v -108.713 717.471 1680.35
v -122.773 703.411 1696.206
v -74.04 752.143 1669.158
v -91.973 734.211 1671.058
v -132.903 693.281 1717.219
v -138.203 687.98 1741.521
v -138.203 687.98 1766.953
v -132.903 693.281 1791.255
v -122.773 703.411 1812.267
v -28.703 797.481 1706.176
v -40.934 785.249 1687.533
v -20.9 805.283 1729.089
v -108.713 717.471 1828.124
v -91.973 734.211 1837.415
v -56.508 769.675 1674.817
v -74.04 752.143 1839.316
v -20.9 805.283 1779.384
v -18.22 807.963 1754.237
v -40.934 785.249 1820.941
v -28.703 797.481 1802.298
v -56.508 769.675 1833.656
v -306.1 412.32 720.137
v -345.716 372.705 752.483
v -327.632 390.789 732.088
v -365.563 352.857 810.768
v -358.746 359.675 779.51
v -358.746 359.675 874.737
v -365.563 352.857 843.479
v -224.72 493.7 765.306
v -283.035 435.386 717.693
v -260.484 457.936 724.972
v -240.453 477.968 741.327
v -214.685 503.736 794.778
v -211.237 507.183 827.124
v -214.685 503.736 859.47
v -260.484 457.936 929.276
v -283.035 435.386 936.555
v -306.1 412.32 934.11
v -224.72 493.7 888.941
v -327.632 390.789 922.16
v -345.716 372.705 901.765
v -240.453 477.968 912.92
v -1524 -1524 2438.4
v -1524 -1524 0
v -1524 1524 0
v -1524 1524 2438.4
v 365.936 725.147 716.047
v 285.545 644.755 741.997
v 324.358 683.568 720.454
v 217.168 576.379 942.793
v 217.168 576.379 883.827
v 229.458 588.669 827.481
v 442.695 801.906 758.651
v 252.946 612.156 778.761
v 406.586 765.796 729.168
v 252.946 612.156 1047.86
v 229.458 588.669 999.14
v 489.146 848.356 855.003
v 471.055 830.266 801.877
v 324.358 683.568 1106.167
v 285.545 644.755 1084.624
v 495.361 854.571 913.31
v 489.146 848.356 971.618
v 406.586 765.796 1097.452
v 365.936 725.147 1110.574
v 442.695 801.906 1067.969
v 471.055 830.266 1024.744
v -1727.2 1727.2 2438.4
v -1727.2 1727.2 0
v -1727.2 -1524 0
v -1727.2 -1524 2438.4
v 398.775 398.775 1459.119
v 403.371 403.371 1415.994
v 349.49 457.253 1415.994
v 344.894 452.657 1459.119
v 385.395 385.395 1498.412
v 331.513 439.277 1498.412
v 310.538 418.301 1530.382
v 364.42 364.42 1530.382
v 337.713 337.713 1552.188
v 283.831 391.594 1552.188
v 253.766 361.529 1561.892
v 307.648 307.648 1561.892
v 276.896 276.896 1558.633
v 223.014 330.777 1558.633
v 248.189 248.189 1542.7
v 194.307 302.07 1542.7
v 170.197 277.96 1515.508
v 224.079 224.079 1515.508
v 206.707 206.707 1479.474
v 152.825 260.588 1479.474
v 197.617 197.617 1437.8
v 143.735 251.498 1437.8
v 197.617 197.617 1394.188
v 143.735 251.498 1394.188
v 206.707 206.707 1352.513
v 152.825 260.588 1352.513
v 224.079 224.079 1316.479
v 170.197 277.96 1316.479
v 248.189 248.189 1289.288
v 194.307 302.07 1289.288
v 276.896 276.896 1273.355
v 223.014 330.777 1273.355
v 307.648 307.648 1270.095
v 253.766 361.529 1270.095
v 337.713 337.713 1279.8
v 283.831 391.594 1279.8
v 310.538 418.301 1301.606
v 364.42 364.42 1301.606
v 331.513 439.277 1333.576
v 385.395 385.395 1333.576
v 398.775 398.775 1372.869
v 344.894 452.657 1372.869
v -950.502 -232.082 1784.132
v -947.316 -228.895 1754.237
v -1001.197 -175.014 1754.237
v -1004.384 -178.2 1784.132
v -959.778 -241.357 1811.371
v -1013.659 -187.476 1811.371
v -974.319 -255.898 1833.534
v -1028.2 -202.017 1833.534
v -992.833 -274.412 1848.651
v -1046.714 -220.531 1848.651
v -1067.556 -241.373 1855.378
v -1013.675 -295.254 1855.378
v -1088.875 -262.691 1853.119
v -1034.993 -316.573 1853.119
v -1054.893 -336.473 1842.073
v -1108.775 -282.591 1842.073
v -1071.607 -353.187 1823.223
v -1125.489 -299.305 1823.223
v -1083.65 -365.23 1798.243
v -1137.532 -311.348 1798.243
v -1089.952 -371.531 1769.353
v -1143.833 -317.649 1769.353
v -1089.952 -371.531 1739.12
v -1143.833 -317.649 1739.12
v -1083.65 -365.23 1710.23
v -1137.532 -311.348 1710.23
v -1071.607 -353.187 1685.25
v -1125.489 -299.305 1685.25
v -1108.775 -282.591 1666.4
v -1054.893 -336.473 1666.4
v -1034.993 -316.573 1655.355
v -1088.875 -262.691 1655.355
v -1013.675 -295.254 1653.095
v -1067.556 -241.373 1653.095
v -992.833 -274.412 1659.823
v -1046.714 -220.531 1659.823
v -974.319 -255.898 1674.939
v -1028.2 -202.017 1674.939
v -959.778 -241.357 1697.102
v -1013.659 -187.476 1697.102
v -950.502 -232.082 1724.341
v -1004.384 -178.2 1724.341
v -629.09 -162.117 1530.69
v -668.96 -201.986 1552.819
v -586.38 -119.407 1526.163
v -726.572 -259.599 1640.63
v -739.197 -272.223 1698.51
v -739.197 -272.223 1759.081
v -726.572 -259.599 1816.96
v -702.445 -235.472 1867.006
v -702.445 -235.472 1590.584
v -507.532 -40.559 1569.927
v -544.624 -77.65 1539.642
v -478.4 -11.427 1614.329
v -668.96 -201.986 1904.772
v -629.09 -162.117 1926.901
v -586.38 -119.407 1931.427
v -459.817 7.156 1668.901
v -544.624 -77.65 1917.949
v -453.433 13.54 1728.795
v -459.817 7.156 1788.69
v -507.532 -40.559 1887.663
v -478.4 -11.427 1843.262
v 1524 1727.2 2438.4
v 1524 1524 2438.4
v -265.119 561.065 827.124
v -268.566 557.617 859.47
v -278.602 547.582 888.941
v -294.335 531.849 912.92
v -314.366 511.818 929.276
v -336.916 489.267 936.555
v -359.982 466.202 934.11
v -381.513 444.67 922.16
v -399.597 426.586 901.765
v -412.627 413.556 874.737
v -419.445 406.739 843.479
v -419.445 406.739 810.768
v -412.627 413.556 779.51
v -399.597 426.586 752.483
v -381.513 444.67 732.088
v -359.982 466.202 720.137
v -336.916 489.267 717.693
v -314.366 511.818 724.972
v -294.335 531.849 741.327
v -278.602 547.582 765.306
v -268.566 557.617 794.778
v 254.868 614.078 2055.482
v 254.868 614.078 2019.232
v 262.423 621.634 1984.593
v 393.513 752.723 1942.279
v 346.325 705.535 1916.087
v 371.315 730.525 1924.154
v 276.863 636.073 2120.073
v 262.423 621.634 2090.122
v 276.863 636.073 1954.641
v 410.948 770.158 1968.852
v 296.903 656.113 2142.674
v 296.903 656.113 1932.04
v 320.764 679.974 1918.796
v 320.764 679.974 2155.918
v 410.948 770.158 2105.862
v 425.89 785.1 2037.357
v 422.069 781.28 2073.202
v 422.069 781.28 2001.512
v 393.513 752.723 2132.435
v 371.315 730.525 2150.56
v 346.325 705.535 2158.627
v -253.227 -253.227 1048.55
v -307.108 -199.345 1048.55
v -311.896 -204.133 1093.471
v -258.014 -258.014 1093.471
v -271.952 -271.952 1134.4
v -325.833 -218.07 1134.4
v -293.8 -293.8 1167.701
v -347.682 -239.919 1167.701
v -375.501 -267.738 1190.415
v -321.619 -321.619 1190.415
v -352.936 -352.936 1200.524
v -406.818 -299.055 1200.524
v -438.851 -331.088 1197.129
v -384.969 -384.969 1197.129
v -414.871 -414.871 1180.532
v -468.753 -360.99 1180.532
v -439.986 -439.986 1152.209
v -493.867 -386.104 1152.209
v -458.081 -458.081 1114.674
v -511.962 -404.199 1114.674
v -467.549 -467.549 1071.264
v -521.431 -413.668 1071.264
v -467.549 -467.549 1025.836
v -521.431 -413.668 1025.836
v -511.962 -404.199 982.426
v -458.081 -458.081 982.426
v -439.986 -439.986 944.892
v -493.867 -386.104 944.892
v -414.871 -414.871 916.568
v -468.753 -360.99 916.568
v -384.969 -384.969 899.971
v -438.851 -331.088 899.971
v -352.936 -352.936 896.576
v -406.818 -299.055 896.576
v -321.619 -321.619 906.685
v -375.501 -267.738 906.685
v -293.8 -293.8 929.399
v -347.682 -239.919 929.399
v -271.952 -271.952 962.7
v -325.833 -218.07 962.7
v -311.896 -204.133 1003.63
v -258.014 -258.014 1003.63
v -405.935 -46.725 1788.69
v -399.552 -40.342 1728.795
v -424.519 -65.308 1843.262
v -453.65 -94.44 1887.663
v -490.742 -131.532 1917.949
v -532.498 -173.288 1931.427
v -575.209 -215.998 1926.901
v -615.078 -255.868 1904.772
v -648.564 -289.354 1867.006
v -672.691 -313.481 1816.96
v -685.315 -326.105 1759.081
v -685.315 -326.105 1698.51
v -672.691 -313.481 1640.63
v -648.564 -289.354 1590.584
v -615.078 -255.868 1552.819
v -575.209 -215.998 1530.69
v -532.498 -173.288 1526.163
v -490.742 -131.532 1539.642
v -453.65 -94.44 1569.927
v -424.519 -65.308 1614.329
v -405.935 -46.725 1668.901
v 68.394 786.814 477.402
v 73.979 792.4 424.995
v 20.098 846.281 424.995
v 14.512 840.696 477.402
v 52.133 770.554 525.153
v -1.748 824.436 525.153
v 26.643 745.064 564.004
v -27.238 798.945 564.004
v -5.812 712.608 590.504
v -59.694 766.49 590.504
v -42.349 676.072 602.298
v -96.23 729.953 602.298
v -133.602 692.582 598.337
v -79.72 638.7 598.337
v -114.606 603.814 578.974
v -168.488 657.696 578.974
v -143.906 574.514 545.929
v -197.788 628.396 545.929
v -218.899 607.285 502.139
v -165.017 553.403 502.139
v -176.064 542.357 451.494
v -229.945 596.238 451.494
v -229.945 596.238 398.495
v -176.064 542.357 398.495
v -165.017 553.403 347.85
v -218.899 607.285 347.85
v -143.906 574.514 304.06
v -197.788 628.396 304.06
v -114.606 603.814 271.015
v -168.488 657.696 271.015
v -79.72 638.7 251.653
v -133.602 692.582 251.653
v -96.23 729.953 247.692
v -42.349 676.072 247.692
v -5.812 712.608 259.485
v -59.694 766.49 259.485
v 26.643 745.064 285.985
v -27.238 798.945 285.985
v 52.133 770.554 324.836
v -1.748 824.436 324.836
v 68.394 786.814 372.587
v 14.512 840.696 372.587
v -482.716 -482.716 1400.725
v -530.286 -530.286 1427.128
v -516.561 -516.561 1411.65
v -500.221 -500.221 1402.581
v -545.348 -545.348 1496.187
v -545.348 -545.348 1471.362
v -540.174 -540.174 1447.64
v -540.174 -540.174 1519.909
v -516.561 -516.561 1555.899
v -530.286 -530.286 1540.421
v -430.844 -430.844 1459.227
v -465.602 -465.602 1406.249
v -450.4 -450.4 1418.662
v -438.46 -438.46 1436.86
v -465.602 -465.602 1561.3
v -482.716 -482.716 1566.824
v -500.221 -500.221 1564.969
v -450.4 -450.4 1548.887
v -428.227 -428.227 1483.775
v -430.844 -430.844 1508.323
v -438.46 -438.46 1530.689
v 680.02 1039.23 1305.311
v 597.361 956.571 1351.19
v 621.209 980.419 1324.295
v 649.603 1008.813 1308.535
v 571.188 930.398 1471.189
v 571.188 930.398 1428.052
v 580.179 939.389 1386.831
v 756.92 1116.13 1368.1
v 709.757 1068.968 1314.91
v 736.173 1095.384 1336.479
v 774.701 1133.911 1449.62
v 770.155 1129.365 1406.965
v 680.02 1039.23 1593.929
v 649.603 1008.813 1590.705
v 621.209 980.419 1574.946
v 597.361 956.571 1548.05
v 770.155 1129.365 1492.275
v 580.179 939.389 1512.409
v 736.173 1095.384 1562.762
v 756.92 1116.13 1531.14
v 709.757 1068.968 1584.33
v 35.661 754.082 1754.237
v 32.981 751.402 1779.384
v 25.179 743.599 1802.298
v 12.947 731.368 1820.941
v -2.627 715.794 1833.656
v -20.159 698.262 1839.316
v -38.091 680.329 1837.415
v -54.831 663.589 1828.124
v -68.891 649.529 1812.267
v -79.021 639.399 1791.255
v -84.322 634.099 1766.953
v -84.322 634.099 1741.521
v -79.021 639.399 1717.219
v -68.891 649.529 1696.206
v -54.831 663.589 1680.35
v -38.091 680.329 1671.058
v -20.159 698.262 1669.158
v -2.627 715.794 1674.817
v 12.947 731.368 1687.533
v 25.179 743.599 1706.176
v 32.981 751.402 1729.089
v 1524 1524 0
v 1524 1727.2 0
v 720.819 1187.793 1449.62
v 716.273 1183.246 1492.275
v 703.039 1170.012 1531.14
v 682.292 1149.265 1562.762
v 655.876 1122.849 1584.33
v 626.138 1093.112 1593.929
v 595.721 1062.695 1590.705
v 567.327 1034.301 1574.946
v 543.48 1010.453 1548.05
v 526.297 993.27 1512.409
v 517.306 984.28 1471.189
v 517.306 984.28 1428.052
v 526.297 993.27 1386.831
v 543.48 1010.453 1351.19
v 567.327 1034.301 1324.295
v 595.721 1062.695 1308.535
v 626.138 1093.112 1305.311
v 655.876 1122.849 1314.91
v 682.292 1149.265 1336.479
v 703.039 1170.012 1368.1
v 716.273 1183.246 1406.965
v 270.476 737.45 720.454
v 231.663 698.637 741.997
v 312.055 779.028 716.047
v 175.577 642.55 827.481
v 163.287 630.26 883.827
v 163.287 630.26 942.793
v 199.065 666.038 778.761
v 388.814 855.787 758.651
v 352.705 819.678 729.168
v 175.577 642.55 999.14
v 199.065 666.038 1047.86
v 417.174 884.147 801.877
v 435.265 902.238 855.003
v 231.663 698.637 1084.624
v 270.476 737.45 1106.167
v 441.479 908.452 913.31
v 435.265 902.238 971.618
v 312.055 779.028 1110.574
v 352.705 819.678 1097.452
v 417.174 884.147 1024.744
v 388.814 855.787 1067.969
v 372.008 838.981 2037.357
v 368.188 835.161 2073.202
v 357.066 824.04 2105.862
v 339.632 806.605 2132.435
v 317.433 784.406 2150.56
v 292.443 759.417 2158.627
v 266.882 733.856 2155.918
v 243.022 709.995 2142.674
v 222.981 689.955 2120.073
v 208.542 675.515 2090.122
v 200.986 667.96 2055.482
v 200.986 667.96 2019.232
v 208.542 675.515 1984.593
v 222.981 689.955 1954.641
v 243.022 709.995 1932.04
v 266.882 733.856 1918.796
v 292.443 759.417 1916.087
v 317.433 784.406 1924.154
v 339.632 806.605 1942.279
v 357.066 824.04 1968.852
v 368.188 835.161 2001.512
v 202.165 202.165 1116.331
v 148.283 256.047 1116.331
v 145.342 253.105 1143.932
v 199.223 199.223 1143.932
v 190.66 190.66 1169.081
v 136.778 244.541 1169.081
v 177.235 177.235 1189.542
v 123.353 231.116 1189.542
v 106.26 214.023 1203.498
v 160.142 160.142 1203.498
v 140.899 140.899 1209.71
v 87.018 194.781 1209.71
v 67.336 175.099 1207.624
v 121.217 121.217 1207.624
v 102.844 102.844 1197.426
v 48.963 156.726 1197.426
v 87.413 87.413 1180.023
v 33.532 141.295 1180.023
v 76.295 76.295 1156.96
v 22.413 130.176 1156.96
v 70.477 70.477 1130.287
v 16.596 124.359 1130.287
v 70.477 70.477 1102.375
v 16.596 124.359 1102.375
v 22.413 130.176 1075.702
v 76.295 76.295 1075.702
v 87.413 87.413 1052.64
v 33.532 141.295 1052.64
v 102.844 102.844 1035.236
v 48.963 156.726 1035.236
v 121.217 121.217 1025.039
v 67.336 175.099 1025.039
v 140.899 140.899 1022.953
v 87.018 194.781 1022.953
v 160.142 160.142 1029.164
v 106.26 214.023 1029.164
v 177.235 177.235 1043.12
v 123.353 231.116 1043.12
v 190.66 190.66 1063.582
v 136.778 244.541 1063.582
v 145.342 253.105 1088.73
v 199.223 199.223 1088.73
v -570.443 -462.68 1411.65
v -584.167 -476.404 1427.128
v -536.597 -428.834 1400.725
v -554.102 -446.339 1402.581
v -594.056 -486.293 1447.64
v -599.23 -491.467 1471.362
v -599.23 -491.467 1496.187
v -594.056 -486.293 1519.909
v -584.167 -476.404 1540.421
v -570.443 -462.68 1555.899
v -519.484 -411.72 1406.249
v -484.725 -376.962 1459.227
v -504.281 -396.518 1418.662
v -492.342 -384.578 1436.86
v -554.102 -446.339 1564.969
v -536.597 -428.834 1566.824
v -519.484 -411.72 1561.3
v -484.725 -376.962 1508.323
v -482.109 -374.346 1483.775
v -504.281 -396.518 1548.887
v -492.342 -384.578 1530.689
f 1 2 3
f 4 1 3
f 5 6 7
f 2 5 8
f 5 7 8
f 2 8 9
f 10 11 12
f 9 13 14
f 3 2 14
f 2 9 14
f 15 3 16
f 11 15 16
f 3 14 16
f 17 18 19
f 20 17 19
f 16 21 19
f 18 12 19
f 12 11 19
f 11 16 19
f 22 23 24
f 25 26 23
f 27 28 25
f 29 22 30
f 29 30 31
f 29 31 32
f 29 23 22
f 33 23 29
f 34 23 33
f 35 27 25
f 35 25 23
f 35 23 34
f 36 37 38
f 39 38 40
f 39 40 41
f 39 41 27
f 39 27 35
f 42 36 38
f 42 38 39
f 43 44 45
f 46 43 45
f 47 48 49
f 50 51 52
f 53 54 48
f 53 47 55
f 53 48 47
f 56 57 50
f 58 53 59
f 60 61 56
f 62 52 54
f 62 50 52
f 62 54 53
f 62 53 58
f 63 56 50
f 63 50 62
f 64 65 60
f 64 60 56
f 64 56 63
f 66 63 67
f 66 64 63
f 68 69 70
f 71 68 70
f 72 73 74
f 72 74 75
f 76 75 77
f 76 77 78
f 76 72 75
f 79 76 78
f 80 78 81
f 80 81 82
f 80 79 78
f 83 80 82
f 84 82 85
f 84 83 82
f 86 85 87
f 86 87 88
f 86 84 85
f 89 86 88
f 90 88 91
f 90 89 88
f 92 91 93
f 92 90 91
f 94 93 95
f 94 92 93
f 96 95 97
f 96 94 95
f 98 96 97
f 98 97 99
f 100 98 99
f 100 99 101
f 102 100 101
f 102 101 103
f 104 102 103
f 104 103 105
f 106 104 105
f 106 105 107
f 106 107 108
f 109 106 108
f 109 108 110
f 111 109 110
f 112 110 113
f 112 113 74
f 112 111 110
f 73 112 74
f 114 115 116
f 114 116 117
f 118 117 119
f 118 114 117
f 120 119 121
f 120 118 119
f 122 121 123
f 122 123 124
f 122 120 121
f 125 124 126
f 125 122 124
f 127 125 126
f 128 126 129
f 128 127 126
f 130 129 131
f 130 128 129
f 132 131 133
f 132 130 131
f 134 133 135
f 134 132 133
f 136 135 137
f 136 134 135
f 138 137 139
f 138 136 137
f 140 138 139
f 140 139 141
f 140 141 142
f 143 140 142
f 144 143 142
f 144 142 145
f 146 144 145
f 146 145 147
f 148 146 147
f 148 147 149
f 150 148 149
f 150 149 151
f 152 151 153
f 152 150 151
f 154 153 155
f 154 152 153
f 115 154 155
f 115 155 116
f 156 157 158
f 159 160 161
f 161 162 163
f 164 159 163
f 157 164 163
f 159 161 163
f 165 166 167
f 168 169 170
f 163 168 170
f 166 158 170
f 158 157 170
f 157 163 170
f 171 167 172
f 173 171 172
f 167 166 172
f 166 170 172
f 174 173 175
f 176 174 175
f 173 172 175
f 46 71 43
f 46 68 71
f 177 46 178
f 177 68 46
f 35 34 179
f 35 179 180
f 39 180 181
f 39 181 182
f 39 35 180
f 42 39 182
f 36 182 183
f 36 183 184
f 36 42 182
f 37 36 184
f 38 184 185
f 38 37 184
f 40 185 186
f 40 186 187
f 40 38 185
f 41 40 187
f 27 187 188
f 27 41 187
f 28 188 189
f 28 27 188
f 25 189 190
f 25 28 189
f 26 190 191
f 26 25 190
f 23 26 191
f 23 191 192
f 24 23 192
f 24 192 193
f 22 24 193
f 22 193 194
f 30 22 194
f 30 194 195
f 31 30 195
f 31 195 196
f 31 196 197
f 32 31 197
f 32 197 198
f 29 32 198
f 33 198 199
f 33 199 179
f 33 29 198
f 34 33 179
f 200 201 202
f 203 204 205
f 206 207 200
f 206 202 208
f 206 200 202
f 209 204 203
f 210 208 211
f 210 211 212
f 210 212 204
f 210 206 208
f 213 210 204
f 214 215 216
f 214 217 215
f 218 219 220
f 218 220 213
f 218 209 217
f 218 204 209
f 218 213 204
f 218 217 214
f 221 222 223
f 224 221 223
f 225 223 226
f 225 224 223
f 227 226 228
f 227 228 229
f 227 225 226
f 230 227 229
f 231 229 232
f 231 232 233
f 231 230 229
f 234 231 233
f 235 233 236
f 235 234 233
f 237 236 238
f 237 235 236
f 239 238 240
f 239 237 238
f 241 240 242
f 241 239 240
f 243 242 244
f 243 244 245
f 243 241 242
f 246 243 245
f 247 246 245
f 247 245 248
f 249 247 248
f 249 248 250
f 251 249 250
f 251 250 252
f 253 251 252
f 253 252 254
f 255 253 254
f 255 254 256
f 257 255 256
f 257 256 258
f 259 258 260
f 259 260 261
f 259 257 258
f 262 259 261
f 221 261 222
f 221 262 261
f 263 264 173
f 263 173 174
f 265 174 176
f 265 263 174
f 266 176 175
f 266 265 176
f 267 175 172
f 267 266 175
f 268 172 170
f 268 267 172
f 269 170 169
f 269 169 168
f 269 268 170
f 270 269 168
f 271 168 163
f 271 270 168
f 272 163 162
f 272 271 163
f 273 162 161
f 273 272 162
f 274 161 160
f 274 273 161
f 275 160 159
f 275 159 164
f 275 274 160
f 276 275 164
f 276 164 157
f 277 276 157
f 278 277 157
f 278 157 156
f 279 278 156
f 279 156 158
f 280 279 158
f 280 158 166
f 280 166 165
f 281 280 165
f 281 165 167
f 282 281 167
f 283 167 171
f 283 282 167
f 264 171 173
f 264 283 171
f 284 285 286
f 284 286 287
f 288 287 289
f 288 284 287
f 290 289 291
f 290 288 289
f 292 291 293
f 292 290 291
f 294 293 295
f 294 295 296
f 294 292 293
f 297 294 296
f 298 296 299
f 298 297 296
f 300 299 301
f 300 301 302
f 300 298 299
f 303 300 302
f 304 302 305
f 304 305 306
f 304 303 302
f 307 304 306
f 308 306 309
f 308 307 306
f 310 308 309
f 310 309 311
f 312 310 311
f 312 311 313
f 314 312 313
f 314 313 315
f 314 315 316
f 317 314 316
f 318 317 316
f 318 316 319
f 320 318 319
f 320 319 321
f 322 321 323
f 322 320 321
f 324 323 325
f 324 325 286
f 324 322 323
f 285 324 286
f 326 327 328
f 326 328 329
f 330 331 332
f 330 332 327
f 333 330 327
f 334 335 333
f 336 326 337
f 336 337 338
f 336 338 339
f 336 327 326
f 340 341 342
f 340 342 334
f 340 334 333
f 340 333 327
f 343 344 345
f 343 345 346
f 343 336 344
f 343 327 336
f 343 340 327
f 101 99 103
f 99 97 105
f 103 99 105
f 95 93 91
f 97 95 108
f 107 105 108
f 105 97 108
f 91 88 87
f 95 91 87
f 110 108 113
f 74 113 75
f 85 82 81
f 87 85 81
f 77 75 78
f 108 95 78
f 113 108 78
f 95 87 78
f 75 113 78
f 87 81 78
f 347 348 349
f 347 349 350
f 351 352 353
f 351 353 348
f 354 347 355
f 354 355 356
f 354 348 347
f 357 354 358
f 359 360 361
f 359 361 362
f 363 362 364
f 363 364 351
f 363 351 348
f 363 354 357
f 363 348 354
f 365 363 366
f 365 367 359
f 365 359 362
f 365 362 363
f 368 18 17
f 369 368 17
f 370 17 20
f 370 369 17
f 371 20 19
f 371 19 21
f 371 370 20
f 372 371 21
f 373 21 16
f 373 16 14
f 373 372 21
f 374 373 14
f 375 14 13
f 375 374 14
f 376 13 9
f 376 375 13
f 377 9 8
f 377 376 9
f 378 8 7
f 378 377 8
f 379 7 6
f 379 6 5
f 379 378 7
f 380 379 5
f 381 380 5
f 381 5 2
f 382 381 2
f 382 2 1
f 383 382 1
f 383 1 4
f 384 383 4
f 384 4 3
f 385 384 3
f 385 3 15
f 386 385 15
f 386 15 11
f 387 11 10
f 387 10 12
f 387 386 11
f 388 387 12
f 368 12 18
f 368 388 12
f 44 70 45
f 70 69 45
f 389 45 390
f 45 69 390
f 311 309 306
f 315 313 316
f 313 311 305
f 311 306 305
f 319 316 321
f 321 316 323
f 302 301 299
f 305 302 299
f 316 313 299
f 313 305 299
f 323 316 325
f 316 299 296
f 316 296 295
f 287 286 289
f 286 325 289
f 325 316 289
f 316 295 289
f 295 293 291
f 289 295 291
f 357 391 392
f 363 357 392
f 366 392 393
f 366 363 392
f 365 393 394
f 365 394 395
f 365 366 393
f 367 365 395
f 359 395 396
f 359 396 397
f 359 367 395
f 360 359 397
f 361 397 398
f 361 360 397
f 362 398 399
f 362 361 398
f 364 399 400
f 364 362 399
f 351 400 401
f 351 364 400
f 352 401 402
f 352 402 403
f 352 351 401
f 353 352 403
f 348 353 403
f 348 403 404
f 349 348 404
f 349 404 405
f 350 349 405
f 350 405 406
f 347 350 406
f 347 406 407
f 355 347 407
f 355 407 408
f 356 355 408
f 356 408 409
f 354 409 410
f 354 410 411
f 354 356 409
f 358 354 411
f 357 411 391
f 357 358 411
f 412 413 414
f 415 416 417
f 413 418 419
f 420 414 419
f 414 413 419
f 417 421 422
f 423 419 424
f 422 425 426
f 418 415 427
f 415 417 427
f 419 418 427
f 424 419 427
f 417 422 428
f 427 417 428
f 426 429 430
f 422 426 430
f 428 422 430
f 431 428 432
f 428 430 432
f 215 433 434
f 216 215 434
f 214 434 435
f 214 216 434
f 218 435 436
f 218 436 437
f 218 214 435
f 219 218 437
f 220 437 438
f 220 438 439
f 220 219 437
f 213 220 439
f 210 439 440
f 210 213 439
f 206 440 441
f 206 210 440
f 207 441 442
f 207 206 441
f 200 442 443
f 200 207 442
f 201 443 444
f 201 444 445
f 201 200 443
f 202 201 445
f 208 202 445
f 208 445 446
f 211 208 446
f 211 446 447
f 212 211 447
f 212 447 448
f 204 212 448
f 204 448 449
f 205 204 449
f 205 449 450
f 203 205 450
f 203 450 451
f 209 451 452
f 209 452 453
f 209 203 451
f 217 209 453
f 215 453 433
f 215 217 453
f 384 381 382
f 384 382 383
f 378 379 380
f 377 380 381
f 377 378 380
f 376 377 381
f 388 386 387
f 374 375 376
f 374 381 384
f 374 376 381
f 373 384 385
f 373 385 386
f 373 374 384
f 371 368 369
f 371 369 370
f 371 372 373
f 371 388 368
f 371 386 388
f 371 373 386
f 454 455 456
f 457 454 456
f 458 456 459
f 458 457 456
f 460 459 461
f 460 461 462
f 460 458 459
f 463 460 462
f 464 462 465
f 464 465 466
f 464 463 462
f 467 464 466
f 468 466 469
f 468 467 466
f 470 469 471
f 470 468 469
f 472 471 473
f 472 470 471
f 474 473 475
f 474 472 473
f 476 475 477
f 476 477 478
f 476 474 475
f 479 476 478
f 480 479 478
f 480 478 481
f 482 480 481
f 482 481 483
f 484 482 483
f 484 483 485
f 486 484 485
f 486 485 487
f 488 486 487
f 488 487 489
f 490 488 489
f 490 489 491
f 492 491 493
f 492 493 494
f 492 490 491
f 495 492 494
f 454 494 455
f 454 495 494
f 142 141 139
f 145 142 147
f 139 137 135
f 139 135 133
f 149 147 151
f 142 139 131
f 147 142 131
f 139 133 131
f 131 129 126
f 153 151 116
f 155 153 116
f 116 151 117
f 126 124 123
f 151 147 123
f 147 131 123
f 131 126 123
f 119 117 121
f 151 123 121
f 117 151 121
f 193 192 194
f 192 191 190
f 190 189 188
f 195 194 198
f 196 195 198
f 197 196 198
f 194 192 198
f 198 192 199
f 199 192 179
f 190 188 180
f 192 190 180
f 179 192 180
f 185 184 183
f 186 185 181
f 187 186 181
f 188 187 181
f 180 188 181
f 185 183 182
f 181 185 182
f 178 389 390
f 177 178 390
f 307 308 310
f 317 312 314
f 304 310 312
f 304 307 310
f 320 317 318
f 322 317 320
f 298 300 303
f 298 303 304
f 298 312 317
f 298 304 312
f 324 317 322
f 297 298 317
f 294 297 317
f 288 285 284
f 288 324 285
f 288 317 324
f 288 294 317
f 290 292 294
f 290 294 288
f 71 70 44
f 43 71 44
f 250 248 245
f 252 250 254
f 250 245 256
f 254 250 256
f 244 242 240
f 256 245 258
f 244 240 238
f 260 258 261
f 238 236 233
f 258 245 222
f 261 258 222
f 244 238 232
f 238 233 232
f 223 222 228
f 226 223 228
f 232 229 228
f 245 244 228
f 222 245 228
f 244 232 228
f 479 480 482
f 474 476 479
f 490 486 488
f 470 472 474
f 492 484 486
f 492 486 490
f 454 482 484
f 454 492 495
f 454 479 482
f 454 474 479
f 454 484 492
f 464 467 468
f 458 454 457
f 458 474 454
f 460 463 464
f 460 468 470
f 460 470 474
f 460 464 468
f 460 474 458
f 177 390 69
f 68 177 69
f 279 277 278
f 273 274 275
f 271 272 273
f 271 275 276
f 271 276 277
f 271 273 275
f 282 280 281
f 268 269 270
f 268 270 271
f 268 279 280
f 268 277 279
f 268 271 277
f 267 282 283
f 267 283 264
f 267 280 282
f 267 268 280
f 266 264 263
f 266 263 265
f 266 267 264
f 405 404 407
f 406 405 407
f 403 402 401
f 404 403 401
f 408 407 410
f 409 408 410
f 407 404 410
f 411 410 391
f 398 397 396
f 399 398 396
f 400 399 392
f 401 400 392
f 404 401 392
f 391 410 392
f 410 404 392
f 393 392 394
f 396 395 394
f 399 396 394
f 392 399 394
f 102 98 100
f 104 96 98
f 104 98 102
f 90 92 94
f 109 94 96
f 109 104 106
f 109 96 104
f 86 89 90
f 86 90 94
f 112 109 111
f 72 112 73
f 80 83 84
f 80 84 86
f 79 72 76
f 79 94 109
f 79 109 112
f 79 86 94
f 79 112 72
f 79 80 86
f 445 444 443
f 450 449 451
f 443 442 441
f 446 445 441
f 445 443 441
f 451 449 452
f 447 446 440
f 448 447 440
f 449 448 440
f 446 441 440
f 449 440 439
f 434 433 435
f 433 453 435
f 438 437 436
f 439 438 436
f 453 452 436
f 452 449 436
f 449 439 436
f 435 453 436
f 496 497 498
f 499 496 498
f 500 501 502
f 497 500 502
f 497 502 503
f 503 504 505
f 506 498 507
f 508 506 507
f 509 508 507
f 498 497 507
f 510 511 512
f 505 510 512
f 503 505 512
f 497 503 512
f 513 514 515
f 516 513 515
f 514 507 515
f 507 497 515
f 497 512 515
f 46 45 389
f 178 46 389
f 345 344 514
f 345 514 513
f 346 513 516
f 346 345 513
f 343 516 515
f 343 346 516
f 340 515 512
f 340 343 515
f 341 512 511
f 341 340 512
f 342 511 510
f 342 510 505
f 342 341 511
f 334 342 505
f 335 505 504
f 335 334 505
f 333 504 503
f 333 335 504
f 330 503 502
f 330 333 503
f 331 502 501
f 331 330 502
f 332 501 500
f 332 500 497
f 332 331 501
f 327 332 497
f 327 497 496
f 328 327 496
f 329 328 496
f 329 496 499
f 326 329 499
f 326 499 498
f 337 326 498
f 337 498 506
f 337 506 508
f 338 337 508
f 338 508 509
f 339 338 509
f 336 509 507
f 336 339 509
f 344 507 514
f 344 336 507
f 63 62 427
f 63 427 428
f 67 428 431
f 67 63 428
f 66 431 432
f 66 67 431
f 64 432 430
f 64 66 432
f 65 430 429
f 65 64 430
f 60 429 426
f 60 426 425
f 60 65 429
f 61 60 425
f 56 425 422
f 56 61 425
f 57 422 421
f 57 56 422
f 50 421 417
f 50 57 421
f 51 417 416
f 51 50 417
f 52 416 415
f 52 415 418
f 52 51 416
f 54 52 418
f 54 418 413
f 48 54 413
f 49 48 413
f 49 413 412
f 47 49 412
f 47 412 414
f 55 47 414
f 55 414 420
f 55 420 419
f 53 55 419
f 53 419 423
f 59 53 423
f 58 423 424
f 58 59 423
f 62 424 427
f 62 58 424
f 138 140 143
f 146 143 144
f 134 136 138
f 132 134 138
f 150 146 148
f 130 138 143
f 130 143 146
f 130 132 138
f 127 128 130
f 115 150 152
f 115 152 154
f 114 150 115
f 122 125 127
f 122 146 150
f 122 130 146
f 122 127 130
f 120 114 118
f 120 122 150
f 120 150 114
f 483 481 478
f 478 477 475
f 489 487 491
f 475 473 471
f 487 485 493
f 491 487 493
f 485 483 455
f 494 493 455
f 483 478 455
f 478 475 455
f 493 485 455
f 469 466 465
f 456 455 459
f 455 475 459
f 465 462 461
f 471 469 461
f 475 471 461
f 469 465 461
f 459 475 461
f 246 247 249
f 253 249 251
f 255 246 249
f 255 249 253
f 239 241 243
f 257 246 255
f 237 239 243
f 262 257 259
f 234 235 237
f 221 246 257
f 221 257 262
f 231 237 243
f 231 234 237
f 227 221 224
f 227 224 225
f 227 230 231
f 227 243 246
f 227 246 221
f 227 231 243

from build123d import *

# Parameters (mm, degrees)
F2_DEPTH  = 2438.4
F10_R     = 83.2821994421
F12_DEPTH = 76.2
F10_R_2   = 152.4
F10_R_3   = 146.3074713627
F10_R_4   = 93.640283176
F11_R     = 203.2
F13_DEPTH = 76.2
F11_R_2   = 197.8162227078
F11_R_3   = 144.713464529
F11_R_4   = 121.6097253427
F14_R     = 101.4249992997
F15_DEPTH = 76.2
F14_R_2   = 177.8
F14_R_3   = 85.3174196107
F14_R_4   = 109.7379276923


with BuildPart() as f2:
    # F1 (on face) → F2 (new body)
    with BuildSketch(Plane.XY):
        Polygon((-1727.2, -1524), (-1524, -1524), (-1524, 1524), (1524, 1524), (1524, 1727.2), (-1524, 1727.2), (-1727.2, 1727.2), (-1727.2, 1524), align=None)
    extrude(amount=F2_DEPTH)


with BuildPart() as f12:
    # F10 (on 3pt) → F12 (new body)
    with BuildSketch(Plane(origin=(0, 0, 0), x_dir=(0.7071067812, 0.7071067812, 0), z_dir=(0.7071067812, -0.7071067812, 0))):
        with Locations((-688.8870664728, 1483.7746525079)):
            Circle(F10_R)
    extrude(amount=-F12_DEPTH)


with BuildPart() as f12b:
    # F10 (on 3pt) → F12, piece 2 (new body)
    with BuildSketch(Plane(origin=(0, 0, 0), x_dir=(0.7071067812, 0.7071067812, 0), z_dir=(0.7071067812, -0.7071067812, 0))):
        with Locations((-510.516388369, 1048.5502269928)):
            Circle(F10_R_2)
    extrude(amount=-F12_DEPTH)


with BuildPart() as f12c:
    # F10 (on 3pt) → F12, piece 3 (new body)
    with BuildSketch(Plane(origin=(0, 0, 0), x_dir=(0.7071067812, 0.7071067812, 0), z_dir=(0.7071067812, -0.7071067812, 0))):
        with Locations((424.1459196934, 1415.9937991334)):
            Circle(F10_R_3)
    extrude(amount=-F12_DEPTH)


with BuildPart() as f12d:
    # F10 (on 3pt) → F12, piece 4 (new body)
    with BuildSketch(Plane(origin=(0, 0, 0), x_dir=(0.7071067812, 0.7071067812, 0), z_dir=(0.7071067812, -0.7071067812, 0))):
        with Locations((192.2641619254, 1116.3310803673)):
            Circle(F10_R_4)
    extrude(amount=-F12_DEPTH)


with BuildPart() as f13:
    # F11 (on offset) → F13 (new body)
    with BuildSketch(Plane(origin=(-179.6051224214, 179.6051224214, 0), x_dir=(0.7071067812, 0.7071067812, 0), z_dir=(0.7071067812, -0.7071067812, 0))):
        with Locations((-514.2516005313, 1728.7953008949)):
            Circle(F11_R)
    extrude(amount=-F13_DEPTH)


with BuildPart() as f13b:
    # F11 (on offset) → F13, piece 2 (new body)
    with BuildSketch(Plane(origin=(-179.6051224214, 179.6051224214, 0), x_dir=(0.7071067812, 0.7071067812, 0), z_dir=(0.7071067812, -0.7071067812, 0))):
        with Locations((756.7294072077, 913.3104132137)):
            Circle(F11_R_2)
    extrude(amount=-F13_DEPTH)


with BuildPart() as f13c:
    # F11 (on offset) → F13, piece 3 (new body)
    with BuildSketch(Plane(origin=(-179.6051224214, 179.6051224214, 0), x_dir=(0.7071067812, 0.7071067812, 0), z_dir=(0.7071067812, -0.7071067812, 0))):
        with Locations((1204.8788329365, 1449.6202640783)):
            Circle(F11_R_3)
    extrude(amount=-F13_DEPTH)


with BuildPart() as f13d:
    # F11 (on offset) → F13, piece 4 (new body)
    with BuildSketch(Plane(origin=(-179.6051224214, 179.6051224214, 0), x_dir=(0.7071067812, 0.7071067812, 0), z_dir=(0.7071067812, -0.7071067812, 0))):
        with Locations((734.6892776268, 2037.3571150275)):
            Circle(F11_R_4)
    extrude(amount=-F13_DEPTH)


with BuildPart() as f15:
    # F14 (on offset) → F15 (new body)
    with BuildSketch(Plane(origin=(-359.2102448428, 359.2102448428, 0), x_dir=(0.7071067812, 0.7071067812, 0), z_dir=(0.7071067812, -0.7071067812, 0))):
        with Locations((-933.1320524216, 1754.2366981506)):
            Circle(F14_R)
    extrude(amount=-F15_DEPTH)


with BuildPart() as f15b:
    # F14 (on offset) → F15, piece 2 (new body)
    with BuildSketch(Plane(origin=(-359.2102448428, 359.2102448428, 0), x_dir=(0.7071067812, 0.7071067812, 0), z_dir=(0.7071067812, -0.7071067812, 0))):
        with Locations((434.8226189613, 424.9947369099)):
            Circle(F14_R_2)
    extrude(amount=-F15_DEPTH)


with BuildPart() as f15c:
    # F14 (on offset) → F15, piece 3 (new body)
    with BuildSketch(Plane(origin=(-359.2102448428, 359.2102448428, 0), x_dir=(0.7071067812, 0.7071067812, 0), z_dir=(0.7071067812, -0.7071067812, 0))):
        with Locations((473.1154739857, 1754.2366981506)):
            Circle(F14_R_3)
    extrude(amount=-F15_DEPTH)


with BuildPart() as f15d:
    # F14 (on offset) → F15, piece 4 (new body)
    with BuildSketch(Plane(origin=(-359.2102448428, 359.2102448428, 0), x_dir=(0.7071067812, 0.7071067812, 0), z_dir=(0.7071067812, -0.7071067812, 0))):
        with Locations((99.527645536, 827.1238937466)):
            Circle(F14_R_4)
    extrude(amount=-F15_DEPTH)


solid = Compound([f2.part, f12.part, f12b.part, f12c.part, f12d.part, f13.part, f13b.part, f13c.part, f13d.part, f15.part, f15b.part, f15c.part, f15d.part])
